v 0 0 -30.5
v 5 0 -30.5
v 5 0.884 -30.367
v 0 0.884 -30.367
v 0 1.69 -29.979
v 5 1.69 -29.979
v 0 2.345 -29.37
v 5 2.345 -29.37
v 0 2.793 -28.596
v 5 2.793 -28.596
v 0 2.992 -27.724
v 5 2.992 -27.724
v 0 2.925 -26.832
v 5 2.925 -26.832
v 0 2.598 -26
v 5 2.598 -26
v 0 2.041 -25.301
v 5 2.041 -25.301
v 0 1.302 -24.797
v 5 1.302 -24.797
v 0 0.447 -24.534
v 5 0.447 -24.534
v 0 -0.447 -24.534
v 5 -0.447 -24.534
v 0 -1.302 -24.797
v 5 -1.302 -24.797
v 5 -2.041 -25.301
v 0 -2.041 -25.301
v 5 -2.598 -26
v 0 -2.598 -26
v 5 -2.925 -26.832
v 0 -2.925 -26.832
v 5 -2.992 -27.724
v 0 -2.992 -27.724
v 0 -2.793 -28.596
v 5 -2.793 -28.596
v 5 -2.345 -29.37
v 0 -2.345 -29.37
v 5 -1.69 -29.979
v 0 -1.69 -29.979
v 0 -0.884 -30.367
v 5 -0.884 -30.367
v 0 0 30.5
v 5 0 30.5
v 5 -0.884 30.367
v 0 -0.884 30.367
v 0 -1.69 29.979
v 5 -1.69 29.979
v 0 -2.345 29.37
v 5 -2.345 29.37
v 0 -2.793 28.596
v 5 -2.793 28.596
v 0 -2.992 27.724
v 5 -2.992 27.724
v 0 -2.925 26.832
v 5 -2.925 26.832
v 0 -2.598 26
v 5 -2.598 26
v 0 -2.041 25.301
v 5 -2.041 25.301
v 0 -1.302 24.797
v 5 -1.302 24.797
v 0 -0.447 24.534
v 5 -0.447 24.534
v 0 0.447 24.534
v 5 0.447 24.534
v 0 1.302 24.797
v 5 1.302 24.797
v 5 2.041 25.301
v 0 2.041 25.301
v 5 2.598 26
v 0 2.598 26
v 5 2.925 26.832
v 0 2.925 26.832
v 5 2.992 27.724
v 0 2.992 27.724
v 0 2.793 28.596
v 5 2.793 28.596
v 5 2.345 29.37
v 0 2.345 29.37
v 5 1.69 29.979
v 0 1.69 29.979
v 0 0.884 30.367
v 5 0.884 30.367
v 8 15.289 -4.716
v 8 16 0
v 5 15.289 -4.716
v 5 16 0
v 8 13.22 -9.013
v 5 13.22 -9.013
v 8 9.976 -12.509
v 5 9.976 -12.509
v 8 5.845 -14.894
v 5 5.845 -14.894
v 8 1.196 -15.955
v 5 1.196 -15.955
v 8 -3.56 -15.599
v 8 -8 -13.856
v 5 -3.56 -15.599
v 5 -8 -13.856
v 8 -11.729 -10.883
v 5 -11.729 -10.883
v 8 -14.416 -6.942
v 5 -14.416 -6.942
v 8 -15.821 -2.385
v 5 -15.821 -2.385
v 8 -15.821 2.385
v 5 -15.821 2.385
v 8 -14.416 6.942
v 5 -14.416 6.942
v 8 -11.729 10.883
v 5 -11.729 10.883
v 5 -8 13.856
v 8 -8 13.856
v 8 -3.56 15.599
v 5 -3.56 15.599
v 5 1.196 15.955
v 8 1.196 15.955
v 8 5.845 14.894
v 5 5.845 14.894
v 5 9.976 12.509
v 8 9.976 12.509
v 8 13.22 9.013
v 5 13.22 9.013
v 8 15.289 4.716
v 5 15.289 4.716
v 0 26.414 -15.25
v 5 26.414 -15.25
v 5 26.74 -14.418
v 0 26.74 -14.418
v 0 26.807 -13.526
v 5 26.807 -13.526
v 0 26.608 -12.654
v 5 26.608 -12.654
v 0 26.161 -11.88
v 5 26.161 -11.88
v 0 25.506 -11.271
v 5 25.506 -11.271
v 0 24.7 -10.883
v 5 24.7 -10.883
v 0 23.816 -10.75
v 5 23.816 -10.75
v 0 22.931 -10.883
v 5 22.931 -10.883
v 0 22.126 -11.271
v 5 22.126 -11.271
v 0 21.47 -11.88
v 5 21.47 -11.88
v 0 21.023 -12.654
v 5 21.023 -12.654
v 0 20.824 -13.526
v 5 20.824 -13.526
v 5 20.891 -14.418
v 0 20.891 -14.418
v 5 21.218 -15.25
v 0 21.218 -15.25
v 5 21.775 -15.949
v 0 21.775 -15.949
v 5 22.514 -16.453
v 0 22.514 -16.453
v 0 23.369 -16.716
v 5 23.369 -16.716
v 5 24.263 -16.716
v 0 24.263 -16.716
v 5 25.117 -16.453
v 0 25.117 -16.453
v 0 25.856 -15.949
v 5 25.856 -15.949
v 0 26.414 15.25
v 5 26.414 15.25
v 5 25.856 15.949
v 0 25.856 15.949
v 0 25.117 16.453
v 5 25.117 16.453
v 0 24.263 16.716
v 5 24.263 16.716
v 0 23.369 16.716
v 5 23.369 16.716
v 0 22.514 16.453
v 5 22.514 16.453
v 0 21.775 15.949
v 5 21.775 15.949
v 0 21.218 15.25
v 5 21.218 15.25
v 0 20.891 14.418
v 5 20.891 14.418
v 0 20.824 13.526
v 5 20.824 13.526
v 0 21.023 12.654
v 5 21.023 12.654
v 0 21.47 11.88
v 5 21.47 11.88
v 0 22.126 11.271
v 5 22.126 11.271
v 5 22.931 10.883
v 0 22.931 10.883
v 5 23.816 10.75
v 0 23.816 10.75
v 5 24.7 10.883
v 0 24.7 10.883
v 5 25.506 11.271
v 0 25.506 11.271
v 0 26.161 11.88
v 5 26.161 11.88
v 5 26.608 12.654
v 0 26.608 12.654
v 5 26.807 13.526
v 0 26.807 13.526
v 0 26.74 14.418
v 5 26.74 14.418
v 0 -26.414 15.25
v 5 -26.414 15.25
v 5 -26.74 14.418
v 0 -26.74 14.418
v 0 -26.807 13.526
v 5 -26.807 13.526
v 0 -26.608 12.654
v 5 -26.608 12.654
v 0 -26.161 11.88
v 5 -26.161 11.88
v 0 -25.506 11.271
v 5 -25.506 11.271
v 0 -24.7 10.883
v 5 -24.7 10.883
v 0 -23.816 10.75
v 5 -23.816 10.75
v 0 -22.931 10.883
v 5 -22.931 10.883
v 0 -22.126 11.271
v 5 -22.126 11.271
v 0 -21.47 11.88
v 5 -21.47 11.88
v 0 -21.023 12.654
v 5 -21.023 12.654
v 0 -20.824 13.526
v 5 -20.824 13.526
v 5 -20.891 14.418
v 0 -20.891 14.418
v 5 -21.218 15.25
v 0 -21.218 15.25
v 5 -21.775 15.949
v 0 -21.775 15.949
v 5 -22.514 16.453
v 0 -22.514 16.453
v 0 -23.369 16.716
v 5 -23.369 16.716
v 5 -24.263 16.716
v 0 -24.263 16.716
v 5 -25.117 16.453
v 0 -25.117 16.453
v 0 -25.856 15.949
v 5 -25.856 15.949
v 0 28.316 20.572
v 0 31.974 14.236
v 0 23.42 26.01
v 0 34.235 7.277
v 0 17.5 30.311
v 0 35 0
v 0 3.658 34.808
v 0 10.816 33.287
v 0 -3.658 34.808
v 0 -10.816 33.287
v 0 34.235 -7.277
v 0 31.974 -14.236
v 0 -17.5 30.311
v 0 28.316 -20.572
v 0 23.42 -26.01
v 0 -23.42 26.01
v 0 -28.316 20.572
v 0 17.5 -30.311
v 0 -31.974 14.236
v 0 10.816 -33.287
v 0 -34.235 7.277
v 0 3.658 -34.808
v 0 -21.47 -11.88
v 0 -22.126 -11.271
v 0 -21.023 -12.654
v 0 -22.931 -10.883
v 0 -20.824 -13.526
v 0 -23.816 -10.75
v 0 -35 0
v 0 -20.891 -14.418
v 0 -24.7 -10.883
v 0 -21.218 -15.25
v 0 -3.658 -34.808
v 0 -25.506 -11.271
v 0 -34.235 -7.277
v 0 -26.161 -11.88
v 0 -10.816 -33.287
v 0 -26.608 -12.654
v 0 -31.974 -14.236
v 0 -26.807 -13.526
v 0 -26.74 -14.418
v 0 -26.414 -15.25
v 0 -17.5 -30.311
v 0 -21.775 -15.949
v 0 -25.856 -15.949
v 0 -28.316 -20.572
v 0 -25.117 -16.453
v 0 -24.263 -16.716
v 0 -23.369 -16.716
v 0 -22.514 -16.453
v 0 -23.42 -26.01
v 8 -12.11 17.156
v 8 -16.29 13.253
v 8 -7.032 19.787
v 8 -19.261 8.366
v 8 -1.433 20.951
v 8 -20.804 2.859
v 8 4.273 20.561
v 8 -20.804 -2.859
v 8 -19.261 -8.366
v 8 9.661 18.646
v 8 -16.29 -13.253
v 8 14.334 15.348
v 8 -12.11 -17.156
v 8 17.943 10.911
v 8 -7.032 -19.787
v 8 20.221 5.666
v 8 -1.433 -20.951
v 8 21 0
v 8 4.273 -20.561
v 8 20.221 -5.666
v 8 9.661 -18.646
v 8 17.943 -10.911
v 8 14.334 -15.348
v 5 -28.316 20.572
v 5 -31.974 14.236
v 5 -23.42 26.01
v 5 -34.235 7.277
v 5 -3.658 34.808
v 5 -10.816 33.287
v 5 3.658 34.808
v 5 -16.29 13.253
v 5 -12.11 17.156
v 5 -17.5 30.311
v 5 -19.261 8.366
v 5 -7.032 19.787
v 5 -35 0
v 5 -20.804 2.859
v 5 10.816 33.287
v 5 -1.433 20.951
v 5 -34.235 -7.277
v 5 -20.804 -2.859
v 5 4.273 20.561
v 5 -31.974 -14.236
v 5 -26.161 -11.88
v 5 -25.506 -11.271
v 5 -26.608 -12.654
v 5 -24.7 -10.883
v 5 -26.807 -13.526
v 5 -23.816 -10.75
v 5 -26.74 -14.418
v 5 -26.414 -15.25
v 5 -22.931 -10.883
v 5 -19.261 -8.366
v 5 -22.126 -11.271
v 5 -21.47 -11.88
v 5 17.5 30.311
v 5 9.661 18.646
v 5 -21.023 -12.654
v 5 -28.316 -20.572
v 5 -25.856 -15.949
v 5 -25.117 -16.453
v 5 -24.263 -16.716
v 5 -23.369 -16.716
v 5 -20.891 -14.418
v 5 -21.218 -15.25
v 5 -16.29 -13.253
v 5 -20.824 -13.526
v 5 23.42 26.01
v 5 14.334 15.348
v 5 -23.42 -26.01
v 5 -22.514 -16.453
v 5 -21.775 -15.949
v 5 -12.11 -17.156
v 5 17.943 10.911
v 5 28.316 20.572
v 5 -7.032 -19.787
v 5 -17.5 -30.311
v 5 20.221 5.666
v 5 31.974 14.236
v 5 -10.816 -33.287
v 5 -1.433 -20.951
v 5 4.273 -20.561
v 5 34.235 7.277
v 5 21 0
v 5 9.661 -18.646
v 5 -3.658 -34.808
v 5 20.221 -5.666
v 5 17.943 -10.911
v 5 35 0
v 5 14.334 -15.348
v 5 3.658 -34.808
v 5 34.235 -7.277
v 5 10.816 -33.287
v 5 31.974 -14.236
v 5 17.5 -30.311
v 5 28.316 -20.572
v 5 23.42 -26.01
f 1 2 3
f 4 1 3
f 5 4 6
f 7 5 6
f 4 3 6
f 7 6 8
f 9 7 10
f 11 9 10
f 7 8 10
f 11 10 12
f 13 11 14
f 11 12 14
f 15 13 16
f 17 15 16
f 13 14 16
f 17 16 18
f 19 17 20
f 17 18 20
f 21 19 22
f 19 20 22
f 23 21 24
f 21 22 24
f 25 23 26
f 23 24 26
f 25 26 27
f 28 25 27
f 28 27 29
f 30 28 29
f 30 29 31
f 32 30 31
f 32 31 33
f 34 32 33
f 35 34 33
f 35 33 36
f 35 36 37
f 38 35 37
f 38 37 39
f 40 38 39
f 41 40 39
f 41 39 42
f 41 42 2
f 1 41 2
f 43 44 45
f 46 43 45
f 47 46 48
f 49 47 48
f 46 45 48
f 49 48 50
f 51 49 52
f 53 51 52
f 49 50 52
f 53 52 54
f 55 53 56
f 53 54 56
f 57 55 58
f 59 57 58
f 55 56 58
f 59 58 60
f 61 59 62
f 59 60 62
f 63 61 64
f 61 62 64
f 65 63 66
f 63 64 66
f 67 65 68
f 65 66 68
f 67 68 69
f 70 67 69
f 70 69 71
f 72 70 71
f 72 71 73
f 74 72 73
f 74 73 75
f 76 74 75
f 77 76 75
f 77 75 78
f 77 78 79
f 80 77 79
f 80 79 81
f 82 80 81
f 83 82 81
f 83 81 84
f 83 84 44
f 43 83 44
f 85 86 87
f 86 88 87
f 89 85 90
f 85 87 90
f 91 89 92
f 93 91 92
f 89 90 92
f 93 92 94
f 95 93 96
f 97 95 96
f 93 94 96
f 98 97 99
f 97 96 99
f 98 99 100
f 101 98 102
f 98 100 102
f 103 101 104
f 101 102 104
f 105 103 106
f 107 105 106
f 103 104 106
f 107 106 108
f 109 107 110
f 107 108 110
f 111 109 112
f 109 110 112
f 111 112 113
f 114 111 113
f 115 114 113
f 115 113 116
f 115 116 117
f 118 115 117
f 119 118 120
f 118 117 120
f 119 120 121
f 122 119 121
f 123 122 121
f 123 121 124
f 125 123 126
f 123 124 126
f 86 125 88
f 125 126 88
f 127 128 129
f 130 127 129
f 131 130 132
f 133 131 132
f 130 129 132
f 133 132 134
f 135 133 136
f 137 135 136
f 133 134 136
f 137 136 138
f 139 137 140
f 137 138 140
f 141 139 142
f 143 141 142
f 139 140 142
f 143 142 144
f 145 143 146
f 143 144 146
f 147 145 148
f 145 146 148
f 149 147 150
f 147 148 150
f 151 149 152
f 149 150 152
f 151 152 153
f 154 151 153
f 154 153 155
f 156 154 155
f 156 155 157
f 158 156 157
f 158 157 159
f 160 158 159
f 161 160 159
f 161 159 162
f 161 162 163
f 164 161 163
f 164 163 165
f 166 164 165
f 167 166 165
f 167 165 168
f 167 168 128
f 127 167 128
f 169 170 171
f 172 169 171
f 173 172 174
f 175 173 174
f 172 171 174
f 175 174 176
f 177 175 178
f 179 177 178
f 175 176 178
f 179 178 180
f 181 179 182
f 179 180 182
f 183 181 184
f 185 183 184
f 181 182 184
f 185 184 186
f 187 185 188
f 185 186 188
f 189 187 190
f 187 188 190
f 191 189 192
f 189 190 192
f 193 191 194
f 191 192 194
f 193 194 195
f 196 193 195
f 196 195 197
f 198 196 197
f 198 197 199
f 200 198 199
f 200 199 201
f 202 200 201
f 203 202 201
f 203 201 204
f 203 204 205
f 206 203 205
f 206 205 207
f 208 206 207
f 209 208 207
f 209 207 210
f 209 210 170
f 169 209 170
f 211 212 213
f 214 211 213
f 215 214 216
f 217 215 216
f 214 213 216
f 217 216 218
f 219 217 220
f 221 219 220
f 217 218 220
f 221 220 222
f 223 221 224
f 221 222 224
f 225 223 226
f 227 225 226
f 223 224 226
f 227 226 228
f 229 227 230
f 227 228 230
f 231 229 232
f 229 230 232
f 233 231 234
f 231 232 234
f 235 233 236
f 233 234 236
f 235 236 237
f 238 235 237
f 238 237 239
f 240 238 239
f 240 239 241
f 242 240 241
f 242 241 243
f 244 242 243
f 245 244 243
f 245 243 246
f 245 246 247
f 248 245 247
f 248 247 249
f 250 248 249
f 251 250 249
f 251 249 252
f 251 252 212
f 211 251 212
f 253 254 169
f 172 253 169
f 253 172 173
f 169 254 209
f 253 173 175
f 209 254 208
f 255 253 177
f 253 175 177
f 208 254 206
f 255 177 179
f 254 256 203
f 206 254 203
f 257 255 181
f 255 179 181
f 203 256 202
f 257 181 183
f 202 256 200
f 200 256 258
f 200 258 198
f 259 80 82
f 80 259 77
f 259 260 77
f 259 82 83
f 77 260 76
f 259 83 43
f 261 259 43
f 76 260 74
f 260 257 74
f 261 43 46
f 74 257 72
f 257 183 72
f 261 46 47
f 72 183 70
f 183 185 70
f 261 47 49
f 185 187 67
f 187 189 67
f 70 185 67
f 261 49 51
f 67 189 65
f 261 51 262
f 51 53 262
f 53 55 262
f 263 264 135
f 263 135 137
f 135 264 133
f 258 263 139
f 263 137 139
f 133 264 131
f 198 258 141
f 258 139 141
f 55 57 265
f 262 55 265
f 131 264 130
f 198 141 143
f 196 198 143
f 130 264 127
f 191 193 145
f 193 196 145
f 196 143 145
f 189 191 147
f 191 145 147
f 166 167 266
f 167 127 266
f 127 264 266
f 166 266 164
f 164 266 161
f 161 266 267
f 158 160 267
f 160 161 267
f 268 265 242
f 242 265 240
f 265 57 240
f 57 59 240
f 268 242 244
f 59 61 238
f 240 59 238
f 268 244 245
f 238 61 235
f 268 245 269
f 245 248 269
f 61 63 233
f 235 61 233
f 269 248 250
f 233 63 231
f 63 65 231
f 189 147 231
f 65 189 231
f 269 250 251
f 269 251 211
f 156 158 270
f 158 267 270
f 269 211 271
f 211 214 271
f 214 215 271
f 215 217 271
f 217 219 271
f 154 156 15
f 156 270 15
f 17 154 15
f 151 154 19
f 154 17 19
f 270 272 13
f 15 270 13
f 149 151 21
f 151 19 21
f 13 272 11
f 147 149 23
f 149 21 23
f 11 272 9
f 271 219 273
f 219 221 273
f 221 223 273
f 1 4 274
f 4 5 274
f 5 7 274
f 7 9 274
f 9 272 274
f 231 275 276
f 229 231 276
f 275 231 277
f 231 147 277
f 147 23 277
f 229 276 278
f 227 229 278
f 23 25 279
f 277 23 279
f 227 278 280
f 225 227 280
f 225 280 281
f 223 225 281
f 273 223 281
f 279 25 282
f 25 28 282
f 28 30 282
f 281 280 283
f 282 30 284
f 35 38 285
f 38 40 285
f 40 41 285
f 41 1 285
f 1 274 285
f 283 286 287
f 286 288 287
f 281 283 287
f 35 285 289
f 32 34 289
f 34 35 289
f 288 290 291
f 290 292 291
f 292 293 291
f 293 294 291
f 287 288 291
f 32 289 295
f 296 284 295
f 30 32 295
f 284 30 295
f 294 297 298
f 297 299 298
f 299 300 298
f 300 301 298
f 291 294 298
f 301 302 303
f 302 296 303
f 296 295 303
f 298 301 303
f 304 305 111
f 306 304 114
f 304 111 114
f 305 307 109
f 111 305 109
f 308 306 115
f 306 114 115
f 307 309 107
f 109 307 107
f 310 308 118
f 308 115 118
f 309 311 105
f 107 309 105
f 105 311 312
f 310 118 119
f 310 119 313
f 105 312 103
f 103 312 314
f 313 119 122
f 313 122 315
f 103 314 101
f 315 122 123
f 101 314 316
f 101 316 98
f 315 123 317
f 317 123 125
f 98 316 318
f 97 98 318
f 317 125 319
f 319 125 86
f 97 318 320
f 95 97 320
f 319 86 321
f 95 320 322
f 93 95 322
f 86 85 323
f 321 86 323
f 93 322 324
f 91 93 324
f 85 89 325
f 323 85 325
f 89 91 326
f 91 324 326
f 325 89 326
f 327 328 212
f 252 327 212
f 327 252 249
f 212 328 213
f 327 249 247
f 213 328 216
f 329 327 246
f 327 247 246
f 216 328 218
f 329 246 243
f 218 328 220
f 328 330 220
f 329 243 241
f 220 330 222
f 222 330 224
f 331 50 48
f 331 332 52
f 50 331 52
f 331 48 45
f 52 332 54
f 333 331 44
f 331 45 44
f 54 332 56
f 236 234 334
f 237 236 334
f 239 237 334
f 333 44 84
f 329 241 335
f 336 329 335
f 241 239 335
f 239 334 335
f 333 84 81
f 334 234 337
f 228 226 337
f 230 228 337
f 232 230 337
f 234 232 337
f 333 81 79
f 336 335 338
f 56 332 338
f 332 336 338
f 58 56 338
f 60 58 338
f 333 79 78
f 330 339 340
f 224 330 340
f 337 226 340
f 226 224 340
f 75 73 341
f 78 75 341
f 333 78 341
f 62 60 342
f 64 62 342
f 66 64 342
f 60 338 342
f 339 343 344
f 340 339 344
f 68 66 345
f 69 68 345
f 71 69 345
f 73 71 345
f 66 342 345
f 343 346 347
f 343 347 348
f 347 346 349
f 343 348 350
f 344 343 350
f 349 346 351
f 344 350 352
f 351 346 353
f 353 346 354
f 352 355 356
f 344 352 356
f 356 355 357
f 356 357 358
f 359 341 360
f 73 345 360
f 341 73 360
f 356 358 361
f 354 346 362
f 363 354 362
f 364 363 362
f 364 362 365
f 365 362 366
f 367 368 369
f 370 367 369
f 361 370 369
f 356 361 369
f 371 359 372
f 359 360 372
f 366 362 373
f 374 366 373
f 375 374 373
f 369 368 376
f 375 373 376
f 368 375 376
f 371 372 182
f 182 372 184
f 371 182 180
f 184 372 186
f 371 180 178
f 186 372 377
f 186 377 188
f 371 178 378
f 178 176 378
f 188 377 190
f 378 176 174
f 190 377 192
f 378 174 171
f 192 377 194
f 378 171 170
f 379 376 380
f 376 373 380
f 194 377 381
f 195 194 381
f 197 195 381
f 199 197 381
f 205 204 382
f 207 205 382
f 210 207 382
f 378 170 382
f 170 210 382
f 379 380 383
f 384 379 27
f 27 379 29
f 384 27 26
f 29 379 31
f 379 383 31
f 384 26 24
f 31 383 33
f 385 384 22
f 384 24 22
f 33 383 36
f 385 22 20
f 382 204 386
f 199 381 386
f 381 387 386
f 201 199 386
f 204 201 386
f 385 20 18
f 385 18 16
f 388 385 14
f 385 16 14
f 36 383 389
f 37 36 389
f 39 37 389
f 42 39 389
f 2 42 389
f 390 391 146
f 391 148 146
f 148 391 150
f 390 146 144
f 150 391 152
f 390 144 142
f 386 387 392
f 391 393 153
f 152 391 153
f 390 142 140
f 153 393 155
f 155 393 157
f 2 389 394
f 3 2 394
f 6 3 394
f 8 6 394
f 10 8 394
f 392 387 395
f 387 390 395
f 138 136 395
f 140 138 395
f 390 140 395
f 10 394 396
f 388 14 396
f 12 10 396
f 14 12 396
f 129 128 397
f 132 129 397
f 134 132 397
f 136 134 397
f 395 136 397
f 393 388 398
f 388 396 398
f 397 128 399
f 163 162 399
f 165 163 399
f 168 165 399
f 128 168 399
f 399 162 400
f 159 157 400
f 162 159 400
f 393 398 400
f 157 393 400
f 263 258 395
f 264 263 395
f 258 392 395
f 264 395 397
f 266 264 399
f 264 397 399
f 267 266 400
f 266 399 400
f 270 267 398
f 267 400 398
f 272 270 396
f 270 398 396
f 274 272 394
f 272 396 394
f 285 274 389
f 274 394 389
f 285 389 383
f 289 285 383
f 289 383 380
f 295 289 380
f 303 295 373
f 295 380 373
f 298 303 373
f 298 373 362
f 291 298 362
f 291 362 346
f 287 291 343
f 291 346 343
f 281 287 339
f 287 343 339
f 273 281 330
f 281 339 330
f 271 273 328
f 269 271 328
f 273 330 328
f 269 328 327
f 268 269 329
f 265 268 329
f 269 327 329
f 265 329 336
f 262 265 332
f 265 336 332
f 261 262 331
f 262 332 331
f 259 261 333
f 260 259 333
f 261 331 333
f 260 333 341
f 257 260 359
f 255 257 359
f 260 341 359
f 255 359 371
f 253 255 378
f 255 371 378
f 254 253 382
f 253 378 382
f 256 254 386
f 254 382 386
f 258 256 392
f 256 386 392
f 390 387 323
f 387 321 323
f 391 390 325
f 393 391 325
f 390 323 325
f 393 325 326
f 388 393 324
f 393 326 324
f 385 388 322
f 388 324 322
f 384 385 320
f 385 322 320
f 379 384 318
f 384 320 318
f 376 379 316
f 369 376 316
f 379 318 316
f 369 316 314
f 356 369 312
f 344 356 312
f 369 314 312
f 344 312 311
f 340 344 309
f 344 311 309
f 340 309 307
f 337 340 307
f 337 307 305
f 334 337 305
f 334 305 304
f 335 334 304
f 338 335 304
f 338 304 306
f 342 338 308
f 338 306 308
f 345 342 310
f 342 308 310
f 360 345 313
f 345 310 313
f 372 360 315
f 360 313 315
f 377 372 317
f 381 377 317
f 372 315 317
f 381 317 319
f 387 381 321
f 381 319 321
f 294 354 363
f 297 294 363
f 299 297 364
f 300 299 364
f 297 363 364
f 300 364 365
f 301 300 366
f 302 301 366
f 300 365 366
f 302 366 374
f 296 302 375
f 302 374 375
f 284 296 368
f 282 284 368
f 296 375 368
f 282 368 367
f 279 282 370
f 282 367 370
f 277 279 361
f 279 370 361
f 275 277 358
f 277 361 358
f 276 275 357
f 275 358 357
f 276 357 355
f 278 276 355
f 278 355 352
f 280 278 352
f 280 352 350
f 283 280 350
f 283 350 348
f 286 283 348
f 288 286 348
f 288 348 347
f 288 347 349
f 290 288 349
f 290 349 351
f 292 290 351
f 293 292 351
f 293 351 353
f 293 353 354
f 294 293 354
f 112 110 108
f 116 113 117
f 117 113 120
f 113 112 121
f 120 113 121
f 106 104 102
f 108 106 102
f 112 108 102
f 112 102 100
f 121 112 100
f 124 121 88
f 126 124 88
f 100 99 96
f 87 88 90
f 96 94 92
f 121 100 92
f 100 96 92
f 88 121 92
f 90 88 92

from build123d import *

# Parameters (mm, degrees)
SKETCH2_R          = 3
CUT_EXTRUDE1_DEPTH = 10
CIRPATTERN1_COUNT  = 6


with BuildPart() as part:
    # Sketch1 → Revolve1 (revolve)
    with BuildSketch(Plane.XY):
        Polygon((0, 35), (5, 35), (5, 21), (8, 21), (8, 16), (5, 16), (5, 0), (0, 0), align=None)
    revolve(axis=Axis((5, 0, 0), (-1, 0, 0)))

    # Sketch2 → Cut-Extrude1 (cut)
    with BuildSketch(Plane(origin=(5, 0, 0), x_dir=(0, 0, -1), z_dir=(1, 0, 0))):
        with Locations((27.5, 0)):
            Circle(SKETCH2_R)
    cut_extrude1 = extrude(amount=-CUT_EXTRUDE1_DEPTH, mode=Mode.SUBTRACT)

    # CirPattern1: Cut-Extrude1 ×6 about axis
    cirpattern1_axis = Axis((0, 0, 0), (1, 0, 0))
    for i in range(1, CIRPATTERN1_COUNT):
        add(cut_extrude1.rotate(cirpattern1_axis, i * 360 / CIRPATTERN1_COUNT), mode=Mode.SUBTRACT)


solid = part.part
